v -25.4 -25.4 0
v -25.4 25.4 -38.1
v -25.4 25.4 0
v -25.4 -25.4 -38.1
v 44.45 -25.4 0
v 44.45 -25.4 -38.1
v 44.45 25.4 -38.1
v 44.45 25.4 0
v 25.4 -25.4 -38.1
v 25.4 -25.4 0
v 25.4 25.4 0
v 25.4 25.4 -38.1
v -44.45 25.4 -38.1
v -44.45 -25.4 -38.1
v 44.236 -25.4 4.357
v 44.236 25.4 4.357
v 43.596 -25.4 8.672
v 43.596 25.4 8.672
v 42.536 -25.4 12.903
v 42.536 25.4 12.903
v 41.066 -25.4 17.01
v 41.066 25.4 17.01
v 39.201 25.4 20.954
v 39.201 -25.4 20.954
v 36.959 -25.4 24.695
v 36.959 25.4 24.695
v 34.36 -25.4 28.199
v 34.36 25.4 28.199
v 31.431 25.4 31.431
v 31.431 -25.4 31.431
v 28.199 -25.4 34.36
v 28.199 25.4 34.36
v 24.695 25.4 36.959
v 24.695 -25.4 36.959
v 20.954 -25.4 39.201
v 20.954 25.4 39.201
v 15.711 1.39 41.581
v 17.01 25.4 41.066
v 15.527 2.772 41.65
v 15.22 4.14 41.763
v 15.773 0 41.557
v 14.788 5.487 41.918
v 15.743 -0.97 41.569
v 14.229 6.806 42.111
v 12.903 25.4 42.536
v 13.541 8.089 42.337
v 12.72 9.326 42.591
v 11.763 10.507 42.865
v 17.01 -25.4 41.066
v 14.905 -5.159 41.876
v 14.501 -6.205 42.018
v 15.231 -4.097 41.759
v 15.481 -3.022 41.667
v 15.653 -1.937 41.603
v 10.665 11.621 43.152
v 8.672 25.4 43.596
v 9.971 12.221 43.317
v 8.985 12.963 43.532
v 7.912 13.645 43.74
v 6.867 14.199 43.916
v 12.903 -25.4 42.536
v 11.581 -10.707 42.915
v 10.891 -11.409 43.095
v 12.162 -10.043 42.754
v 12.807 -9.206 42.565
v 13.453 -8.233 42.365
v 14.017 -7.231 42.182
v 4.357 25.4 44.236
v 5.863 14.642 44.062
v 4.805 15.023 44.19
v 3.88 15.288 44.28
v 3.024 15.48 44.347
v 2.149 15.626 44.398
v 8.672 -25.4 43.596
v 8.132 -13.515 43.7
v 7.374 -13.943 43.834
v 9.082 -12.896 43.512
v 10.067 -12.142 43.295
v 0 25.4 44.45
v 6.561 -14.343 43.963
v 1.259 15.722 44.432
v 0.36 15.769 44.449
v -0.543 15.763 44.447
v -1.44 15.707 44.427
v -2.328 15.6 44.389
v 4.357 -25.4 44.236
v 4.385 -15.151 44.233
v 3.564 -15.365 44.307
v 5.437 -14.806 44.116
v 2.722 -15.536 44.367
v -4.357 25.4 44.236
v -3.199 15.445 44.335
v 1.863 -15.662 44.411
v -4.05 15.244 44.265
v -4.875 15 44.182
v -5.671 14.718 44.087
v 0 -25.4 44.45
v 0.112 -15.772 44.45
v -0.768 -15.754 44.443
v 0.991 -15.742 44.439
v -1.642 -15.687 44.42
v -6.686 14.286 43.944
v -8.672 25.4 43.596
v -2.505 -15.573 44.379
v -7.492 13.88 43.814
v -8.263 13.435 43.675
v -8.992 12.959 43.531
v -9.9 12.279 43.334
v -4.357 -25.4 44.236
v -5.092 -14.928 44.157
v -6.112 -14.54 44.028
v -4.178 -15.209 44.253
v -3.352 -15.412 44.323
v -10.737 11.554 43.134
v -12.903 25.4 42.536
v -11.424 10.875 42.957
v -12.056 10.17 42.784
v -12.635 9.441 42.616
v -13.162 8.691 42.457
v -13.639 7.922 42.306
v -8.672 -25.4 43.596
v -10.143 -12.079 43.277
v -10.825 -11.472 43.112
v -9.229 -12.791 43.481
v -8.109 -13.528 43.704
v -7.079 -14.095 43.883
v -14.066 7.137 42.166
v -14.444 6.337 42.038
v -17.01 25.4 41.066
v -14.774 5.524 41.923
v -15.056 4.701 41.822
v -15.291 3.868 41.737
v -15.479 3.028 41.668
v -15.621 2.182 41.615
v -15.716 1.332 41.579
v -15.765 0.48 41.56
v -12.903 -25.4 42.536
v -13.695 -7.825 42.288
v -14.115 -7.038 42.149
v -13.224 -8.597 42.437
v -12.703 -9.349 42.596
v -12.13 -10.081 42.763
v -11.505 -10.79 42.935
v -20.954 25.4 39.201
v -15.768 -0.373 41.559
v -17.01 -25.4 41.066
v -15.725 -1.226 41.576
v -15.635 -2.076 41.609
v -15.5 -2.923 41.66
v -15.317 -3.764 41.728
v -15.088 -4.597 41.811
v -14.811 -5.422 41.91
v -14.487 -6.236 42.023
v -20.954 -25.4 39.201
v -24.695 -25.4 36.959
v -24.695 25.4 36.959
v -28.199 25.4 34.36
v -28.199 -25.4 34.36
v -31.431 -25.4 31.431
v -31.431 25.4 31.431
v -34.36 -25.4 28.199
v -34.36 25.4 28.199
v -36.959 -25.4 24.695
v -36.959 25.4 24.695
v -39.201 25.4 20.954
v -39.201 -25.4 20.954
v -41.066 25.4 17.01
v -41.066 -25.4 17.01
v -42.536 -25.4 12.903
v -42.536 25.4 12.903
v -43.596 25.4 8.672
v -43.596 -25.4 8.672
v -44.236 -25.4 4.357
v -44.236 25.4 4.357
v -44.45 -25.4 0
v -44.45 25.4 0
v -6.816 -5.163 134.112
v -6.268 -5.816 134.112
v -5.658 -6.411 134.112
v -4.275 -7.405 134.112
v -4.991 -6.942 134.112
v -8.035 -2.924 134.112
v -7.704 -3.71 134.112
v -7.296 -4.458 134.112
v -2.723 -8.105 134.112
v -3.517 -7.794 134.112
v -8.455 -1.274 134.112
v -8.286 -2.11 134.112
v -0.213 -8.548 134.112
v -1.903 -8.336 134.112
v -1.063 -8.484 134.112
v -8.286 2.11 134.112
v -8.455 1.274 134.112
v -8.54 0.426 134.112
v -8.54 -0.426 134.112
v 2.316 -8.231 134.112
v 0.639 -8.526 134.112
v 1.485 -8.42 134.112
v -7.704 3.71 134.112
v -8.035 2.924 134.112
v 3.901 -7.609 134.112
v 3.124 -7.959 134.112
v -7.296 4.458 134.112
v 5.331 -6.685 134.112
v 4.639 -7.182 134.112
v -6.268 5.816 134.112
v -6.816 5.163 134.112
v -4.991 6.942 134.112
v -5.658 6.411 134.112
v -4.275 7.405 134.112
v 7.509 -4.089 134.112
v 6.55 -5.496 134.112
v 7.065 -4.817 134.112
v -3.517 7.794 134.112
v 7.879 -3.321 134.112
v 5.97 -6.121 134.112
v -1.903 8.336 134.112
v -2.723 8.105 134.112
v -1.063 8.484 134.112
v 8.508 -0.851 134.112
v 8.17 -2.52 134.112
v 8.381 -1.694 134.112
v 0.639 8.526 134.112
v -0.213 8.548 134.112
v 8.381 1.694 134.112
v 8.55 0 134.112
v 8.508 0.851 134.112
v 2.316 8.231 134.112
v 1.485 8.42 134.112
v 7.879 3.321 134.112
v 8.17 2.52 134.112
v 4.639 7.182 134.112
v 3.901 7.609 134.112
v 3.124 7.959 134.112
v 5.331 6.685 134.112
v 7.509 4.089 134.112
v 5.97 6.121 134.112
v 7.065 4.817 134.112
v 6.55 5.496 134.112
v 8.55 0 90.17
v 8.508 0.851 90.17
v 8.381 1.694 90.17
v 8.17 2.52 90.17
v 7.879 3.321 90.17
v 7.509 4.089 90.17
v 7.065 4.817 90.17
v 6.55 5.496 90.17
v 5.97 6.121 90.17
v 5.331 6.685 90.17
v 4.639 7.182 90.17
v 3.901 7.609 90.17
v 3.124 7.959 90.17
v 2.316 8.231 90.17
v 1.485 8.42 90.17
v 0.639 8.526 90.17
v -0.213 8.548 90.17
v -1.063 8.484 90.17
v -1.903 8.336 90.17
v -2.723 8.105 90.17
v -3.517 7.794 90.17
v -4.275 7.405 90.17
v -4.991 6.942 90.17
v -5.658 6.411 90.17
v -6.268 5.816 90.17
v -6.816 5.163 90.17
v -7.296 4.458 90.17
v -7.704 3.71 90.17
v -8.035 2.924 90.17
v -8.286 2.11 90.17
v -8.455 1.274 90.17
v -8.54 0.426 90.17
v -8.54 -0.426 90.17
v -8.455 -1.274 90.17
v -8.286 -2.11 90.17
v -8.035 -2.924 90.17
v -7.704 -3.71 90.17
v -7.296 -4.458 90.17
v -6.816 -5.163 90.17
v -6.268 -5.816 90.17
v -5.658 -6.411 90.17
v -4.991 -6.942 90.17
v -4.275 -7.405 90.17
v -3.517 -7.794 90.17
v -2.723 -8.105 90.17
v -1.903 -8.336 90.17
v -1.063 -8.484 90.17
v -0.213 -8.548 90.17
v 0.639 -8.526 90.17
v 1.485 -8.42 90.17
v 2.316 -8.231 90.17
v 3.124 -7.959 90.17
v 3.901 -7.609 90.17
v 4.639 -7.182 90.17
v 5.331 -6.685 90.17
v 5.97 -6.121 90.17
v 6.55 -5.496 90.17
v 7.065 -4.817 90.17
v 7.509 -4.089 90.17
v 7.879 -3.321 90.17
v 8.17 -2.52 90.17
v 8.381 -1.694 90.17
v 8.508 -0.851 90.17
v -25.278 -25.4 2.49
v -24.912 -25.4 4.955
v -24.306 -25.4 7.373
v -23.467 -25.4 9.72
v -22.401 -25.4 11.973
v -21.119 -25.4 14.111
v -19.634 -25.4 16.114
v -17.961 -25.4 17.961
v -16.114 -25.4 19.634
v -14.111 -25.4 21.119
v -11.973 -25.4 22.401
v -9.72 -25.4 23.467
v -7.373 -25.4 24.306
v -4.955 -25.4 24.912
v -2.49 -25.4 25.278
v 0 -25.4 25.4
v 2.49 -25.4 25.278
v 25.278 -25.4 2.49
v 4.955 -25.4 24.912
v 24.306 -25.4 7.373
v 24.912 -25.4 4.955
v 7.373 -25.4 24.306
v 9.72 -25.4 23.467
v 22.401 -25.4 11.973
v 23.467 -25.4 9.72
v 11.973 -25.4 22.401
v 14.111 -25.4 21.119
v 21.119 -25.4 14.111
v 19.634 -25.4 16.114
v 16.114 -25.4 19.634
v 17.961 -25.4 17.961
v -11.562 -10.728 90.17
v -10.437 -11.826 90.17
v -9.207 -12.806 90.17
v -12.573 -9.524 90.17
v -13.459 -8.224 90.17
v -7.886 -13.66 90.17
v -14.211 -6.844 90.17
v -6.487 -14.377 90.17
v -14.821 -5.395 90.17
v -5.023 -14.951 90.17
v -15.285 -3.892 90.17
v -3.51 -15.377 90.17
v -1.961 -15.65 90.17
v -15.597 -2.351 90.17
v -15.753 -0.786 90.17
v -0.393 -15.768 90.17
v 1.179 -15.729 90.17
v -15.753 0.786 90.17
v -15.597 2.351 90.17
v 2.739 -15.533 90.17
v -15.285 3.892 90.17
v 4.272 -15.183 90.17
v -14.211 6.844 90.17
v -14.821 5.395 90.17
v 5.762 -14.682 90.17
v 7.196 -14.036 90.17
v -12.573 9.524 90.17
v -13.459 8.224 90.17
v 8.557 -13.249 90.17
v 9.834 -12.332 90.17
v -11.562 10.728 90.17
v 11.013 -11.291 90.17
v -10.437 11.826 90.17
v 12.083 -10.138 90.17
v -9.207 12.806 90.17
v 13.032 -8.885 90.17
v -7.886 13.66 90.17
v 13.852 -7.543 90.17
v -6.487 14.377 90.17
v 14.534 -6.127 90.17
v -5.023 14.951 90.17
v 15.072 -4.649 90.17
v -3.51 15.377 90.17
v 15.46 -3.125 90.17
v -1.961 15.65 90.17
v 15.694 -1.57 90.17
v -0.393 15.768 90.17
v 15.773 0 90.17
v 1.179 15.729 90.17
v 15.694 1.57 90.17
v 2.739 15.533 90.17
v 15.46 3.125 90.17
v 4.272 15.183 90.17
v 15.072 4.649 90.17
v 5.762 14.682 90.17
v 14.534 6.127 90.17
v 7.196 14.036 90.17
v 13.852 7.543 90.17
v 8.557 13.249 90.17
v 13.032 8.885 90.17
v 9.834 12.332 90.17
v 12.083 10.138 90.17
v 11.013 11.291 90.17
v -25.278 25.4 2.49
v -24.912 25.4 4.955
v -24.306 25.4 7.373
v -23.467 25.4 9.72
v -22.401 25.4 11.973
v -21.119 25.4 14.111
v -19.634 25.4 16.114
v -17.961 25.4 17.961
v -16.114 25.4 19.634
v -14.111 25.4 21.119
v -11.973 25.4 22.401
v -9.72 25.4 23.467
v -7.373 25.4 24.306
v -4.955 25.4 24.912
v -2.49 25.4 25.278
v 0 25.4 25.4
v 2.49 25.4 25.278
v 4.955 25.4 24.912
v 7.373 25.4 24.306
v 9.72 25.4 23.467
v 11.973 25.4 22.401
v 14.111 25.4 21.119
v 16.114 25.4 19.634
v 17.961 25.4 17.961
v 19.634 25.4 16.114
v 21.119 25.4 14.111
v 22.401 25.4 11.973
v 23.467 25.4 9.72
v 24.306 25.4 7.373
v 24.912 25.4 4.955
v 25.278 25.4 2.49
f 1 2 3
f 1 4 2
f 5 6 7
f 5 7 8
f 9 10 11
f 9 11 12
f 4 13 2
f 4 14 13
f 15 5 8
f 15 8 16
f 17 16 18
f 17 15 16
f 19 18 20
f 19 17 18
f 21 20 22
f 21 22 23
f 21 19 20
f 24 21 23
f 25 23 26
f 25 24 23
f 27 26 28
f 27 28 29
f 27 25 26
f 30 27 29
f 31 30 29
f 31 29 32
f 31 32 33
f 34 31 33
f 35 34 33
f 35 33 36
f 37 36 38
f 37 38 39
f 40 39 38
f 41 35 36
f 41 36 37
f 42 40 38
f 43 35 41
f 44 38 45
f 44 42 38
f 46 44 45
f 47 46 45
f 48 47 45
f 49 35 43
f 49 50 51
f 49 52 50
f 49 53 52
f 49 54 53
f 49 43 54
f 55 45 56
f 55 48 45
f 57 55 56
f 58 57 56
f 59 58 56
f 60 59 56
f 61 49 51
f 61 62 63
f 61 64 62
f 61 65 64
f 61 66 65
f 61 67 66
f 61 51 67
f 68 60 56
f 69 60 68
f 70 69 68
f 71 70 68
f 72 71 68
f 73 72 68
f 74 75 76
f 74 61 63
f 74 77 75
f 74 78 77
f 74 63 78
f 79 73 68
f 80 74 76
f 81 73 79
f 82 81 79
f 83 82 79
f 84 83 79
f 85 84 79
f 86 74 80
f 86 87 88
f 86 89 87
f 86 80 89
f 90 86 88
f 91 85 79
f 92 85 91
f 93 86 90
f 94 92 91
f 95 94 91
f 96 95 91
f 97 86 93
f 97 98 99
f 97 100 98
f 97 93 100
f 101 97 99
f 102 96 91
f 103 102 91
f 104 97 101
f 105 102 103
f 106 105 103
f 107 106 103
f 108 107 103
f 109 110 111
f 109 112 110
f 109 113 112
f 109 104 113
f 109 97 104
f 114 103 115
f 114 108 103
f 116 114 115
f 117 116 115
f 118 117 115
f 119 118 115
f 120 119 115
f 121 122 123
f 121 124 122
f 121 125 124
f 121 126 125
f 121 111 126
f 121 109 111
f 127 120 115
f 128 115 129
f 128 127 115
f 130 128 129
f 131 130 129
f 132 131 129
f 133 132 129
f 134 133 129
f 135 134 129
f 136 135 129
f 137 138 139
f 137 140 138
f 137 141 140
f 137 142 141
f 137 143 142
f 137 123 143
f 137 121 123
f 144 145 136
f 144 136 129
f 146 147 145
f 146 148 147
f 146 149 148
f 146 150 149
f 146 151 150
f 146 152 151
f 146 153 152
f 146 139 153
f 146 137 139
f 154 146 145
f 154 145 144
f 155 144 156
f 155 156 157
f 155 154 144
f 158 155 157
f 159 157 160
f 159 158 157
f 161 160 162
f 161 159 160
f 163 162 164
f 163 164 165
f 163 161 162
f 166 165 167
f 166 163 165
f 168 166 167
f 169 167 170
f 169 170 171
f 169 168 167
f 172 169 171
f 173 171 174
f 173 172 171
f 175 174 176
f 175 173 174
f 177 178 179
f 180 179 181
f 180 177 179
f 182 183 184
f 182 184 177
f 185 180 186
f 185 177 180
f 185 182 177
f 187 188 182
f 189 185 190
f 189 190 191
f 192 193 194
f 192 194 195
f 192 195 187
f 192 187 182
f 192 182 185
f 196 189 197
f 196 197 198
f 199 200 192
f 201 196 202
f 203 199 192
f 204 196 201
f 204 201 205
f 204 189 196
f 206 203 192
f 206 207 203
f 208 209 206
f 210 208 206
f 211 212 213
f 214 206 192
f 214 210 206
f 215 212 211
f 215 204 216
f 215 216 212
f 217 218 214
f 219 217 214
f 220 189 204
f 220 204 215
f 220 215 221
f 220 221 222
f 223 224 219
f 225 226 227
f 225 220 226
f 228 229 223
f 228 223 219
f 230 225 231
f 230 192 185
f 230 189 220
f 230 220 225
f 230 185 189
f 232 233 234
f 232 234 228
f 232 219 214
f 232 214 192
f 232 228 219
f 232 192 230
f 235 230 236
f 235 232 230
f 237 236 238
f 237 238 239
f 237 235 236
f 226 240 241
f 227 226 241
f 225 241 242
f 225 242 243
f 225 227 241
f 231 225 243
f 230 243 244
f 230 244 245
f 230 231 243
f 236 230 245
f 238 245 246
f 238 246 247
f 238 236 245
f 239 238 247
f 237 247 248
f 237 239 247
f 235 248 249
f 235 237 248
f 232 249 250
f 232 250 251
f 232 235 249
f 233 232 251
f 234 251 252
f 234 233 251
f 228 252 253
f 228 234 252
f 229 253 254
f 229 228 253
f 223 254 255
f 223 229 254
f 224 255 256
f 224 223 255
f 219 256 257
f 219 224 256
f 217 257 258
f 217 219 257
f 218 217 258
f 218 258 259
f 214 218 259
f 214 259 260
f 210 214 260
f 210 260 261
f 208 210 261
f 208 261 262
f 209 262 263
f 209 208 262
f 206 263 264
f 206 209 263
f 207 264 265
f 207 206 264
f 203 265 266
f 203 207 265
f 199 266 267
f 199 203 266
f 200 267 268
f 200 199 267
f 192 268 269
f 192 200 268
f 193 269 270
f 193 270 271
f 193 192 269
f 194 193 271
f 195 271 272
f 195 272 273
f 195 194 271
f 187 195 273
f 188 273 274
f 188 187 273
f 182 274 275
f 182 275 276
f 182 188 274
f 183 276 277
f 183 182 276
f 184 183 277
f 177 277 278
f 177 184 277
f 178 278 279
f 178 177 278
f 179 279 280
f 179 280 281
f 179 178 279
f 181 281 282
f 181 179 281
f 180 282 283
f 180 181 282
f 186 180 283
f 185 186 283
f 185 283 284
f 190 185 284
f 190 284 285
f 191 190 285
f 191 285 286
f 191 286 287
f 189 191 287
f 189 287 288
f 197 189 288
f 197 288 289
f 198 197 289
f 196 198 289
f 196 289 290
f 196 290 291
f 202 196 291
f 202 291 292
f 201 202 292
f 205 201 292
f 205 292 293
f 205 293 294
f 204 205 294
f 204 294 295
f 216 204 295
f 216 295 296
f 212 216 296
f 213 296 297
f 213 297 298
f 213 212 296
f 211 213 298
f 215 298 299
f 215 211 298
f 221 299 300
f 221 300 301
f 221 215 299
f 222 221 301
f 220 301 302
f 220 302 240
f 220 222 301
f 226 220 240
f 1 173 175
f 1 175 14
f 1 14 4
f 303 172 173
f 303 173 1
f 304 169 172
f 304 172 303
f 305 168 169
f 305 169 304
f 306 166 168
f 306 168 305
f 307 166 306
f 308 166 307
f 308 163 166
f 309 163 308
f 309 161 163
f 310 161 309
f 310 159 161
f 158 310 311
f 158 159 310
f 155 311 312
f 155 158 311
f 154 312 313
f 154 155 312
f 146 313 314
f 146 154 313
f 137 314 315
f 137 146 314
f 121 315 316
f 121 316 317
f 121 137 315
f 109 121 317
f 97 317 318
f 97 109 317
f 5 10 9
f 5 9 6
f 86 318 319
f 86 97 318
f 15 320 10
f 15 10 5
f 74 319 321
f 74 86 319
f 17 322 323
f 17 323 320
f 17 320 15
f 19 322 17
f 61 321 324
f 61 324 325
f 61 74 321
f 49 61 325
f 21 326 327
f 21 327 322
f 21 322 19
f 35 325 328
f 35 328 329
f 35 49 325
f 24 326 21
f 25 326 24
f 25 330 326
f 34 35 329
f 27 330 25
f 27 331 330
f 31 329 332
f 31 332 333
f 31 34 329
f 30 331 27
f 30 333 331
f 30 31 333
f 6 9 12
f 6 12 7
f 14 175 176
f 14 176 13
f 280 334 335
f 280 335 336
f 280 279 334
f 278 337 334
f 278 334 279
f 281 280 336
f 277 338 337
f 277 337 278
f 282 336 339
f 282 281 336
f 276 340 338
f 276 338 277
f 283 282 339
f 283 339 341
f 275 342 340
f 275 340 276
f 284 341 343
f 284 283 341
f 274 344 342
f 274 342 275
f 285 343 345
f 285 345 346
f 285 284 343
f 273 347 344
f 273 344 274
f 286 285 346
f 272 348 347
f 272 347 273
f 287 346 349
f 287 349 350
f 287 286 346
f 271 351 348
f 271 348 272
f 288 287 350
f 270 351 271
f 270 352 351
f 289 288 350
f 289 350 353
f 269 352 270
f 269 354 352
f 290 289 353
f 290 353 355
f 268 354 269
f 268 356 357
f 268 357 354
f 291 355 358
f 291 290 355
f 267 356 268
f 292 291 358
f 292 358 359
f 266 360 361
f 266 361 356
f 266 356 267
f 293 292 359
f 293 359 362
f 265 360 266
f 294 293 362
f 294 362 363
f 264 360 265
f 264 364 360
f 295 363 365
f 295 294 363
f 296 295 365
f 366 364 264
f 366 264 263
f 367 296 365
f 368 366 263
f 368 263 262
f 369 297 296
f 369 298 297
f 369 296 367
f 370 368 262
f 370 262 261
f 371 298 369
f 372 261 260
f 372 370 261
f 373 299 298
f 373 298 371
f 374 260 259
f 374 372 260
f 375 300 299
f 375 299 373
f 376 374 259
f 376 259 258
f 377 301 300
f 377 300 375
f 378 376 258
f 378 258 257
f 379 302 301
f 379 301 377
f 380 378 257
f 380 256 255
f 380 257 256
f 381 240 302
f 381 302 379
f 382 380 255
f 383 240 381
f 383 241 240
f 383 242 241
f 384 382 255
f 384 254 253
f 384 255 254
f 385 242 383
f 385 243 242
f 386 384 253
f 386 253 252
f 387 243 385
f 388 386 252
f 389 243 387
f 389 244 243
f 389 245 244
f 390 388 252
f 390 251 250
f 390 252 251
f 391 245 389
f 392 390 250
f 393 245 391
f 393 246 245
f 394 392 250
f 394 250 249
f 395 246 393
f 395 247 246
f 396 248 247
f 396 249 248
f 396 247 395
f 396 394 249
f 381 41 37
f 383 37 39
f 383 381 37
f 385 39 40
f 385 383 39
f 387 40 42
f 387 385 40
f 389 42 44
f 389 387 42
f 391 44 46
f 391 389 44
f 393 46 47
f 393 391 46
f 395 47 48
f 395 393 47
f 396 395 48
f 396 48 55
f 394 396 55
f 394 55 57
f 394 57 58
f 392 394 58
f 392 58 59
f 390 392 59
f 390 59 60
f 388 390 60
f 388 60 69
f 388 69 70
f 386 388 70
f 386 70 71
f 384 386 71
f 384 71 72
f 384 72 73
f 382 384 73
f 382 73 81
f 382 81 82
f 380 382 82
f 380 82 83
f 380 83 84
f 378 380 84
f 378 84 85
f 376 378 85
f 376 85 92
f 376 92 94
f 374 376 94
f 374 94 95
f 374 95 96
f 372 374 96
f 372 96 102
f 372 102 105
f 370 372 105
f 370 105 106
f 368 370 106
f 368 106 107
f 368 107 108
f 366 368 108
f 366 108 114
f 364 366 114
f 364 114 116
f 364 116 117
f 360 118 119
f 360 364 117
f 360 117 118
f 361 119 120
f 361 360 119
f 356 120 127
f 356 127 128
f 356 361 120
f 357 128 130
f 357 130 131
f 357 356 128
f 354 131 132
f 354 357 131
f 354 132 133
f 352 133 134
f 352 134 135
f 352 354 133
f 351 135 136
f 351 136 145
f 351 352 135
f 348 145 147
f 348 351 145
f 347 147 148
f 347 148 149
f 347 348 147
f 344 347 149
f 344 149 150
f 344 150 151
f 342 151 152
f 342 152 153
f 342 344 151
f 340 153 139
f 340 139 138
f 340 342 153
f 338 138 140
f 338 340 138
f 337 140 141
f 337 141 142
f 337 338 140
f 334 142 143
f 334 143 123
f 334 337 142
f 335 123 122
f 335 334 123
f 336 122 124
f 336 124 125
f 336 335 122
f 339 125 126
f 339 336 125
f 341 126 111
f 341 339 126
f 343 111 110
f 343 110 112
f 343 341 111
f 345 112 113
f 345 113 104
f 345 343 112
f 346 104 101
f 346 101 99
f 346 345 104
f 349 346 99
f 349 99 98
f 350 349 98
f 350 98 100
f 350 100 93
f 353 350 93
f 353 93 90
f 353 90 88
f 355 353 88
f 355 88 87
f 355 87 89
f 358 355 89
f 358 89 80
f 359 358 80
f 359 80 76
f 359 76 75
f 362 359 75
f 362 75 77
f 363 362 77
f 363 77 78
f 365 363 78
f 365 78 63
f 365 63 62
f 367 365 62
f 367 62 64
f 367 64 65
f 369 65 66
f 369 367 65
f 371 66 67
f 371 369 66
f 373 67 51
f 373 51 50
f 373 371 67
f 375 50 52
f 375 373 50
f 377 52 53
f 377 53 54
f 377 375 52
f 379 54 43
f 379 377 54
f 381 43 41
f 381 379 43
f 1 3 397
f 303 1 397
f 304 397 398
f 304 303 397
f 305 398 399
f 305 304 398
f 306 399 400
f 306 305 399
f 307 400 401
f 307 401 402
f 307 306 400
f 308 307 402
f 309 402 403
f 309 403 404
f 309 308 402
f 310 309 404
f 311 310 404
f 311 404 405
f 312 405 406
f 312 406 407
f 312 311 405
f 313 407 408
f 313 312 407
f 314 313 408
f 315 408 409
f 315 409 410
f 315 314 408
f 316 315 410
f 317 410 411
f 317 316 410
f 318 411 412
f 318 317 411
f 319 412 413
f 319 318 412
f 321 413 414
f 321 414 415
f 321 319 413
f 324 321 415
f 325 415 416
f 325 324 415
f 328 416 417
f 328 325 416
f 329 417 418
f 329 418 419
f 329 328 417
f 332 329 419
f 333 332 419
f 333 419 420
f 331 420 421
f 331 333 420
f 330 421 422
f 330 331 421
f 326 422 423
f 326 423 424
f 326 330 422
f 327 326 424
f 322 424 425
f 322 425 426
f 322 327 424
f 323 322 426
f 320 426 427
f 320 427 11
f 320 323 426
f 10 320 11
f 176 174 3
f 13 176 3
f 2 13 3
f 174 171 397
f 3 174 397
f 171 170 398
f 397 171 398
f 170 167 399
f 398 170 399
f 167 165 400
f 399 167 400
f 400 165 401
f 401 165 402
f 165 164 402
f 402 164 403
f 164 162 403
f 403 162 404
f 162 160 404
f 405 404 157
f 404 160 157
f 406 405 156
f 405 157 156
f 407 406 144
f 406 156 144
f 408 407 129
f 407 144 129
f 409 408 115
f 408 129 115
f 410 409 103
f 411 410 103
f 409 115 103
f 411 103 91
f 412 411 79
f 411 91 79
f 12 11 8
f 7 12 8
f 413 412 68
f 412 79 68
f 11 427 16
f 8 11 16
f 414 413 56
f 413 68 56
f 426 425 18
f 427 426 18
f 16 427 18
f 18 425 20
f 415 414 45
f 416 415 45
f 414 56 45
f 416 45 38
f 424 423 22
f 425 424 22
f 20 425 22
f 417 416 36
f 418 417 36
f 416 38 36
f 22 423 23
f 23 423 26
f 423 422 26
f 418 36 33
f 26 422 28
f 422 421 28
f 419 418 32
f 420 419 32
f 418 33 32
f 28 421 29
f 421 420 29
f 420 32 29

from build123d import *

# Parameters (mm, degrees)
F1_DEPTH = 25.4
F3_R     = 15.7727010677
F5_R     = 8.5503070877
F6_DEPTH = 43.942


with BuildPart() as f1:
    # F0 (on Front) → F1 (new body, symmetric)
    with BuildSketch(Plane.XZ):
        with BuildLine():
            ThreePointArc((-25.4, 0), (0, 25.4), (25.4, 0))
            Line((25.4, 0), (25.4, -38.1))
            Line((25.4, -38.1), (44.45, -38.1))
            Line((44.45, -38.1), (44.45, 0))
            ThreePointArc((44.45, 0), (0, 44.45), (-44.45, 0))
            Line((-44.45, 0), (-44.45, -38.1))
            Line((-44.45, -38.1), (-25.4, -38.1))
            Line((-25.4, -38.1), (-25.4, 0))
        make_face()
    extrude(amount=F1_DEPTH, both=True)

    # F3 (on offset) → F4 (join, up to the next surface of F1)
    with BuildSketch(Plane.XY.offset(90.17)):
        Circle(F3_R)
    extrude(until=Until.NEXT, dir=(0, 0, -1))

    # F5 (on offset) → F6 (join, symmetric)
    with BuildSketch(Plane.XY.offset(90.17)):
        Circle(F5_R)
    extrude(amount=F6_DEPTH, both=True)


solid = f1.part
